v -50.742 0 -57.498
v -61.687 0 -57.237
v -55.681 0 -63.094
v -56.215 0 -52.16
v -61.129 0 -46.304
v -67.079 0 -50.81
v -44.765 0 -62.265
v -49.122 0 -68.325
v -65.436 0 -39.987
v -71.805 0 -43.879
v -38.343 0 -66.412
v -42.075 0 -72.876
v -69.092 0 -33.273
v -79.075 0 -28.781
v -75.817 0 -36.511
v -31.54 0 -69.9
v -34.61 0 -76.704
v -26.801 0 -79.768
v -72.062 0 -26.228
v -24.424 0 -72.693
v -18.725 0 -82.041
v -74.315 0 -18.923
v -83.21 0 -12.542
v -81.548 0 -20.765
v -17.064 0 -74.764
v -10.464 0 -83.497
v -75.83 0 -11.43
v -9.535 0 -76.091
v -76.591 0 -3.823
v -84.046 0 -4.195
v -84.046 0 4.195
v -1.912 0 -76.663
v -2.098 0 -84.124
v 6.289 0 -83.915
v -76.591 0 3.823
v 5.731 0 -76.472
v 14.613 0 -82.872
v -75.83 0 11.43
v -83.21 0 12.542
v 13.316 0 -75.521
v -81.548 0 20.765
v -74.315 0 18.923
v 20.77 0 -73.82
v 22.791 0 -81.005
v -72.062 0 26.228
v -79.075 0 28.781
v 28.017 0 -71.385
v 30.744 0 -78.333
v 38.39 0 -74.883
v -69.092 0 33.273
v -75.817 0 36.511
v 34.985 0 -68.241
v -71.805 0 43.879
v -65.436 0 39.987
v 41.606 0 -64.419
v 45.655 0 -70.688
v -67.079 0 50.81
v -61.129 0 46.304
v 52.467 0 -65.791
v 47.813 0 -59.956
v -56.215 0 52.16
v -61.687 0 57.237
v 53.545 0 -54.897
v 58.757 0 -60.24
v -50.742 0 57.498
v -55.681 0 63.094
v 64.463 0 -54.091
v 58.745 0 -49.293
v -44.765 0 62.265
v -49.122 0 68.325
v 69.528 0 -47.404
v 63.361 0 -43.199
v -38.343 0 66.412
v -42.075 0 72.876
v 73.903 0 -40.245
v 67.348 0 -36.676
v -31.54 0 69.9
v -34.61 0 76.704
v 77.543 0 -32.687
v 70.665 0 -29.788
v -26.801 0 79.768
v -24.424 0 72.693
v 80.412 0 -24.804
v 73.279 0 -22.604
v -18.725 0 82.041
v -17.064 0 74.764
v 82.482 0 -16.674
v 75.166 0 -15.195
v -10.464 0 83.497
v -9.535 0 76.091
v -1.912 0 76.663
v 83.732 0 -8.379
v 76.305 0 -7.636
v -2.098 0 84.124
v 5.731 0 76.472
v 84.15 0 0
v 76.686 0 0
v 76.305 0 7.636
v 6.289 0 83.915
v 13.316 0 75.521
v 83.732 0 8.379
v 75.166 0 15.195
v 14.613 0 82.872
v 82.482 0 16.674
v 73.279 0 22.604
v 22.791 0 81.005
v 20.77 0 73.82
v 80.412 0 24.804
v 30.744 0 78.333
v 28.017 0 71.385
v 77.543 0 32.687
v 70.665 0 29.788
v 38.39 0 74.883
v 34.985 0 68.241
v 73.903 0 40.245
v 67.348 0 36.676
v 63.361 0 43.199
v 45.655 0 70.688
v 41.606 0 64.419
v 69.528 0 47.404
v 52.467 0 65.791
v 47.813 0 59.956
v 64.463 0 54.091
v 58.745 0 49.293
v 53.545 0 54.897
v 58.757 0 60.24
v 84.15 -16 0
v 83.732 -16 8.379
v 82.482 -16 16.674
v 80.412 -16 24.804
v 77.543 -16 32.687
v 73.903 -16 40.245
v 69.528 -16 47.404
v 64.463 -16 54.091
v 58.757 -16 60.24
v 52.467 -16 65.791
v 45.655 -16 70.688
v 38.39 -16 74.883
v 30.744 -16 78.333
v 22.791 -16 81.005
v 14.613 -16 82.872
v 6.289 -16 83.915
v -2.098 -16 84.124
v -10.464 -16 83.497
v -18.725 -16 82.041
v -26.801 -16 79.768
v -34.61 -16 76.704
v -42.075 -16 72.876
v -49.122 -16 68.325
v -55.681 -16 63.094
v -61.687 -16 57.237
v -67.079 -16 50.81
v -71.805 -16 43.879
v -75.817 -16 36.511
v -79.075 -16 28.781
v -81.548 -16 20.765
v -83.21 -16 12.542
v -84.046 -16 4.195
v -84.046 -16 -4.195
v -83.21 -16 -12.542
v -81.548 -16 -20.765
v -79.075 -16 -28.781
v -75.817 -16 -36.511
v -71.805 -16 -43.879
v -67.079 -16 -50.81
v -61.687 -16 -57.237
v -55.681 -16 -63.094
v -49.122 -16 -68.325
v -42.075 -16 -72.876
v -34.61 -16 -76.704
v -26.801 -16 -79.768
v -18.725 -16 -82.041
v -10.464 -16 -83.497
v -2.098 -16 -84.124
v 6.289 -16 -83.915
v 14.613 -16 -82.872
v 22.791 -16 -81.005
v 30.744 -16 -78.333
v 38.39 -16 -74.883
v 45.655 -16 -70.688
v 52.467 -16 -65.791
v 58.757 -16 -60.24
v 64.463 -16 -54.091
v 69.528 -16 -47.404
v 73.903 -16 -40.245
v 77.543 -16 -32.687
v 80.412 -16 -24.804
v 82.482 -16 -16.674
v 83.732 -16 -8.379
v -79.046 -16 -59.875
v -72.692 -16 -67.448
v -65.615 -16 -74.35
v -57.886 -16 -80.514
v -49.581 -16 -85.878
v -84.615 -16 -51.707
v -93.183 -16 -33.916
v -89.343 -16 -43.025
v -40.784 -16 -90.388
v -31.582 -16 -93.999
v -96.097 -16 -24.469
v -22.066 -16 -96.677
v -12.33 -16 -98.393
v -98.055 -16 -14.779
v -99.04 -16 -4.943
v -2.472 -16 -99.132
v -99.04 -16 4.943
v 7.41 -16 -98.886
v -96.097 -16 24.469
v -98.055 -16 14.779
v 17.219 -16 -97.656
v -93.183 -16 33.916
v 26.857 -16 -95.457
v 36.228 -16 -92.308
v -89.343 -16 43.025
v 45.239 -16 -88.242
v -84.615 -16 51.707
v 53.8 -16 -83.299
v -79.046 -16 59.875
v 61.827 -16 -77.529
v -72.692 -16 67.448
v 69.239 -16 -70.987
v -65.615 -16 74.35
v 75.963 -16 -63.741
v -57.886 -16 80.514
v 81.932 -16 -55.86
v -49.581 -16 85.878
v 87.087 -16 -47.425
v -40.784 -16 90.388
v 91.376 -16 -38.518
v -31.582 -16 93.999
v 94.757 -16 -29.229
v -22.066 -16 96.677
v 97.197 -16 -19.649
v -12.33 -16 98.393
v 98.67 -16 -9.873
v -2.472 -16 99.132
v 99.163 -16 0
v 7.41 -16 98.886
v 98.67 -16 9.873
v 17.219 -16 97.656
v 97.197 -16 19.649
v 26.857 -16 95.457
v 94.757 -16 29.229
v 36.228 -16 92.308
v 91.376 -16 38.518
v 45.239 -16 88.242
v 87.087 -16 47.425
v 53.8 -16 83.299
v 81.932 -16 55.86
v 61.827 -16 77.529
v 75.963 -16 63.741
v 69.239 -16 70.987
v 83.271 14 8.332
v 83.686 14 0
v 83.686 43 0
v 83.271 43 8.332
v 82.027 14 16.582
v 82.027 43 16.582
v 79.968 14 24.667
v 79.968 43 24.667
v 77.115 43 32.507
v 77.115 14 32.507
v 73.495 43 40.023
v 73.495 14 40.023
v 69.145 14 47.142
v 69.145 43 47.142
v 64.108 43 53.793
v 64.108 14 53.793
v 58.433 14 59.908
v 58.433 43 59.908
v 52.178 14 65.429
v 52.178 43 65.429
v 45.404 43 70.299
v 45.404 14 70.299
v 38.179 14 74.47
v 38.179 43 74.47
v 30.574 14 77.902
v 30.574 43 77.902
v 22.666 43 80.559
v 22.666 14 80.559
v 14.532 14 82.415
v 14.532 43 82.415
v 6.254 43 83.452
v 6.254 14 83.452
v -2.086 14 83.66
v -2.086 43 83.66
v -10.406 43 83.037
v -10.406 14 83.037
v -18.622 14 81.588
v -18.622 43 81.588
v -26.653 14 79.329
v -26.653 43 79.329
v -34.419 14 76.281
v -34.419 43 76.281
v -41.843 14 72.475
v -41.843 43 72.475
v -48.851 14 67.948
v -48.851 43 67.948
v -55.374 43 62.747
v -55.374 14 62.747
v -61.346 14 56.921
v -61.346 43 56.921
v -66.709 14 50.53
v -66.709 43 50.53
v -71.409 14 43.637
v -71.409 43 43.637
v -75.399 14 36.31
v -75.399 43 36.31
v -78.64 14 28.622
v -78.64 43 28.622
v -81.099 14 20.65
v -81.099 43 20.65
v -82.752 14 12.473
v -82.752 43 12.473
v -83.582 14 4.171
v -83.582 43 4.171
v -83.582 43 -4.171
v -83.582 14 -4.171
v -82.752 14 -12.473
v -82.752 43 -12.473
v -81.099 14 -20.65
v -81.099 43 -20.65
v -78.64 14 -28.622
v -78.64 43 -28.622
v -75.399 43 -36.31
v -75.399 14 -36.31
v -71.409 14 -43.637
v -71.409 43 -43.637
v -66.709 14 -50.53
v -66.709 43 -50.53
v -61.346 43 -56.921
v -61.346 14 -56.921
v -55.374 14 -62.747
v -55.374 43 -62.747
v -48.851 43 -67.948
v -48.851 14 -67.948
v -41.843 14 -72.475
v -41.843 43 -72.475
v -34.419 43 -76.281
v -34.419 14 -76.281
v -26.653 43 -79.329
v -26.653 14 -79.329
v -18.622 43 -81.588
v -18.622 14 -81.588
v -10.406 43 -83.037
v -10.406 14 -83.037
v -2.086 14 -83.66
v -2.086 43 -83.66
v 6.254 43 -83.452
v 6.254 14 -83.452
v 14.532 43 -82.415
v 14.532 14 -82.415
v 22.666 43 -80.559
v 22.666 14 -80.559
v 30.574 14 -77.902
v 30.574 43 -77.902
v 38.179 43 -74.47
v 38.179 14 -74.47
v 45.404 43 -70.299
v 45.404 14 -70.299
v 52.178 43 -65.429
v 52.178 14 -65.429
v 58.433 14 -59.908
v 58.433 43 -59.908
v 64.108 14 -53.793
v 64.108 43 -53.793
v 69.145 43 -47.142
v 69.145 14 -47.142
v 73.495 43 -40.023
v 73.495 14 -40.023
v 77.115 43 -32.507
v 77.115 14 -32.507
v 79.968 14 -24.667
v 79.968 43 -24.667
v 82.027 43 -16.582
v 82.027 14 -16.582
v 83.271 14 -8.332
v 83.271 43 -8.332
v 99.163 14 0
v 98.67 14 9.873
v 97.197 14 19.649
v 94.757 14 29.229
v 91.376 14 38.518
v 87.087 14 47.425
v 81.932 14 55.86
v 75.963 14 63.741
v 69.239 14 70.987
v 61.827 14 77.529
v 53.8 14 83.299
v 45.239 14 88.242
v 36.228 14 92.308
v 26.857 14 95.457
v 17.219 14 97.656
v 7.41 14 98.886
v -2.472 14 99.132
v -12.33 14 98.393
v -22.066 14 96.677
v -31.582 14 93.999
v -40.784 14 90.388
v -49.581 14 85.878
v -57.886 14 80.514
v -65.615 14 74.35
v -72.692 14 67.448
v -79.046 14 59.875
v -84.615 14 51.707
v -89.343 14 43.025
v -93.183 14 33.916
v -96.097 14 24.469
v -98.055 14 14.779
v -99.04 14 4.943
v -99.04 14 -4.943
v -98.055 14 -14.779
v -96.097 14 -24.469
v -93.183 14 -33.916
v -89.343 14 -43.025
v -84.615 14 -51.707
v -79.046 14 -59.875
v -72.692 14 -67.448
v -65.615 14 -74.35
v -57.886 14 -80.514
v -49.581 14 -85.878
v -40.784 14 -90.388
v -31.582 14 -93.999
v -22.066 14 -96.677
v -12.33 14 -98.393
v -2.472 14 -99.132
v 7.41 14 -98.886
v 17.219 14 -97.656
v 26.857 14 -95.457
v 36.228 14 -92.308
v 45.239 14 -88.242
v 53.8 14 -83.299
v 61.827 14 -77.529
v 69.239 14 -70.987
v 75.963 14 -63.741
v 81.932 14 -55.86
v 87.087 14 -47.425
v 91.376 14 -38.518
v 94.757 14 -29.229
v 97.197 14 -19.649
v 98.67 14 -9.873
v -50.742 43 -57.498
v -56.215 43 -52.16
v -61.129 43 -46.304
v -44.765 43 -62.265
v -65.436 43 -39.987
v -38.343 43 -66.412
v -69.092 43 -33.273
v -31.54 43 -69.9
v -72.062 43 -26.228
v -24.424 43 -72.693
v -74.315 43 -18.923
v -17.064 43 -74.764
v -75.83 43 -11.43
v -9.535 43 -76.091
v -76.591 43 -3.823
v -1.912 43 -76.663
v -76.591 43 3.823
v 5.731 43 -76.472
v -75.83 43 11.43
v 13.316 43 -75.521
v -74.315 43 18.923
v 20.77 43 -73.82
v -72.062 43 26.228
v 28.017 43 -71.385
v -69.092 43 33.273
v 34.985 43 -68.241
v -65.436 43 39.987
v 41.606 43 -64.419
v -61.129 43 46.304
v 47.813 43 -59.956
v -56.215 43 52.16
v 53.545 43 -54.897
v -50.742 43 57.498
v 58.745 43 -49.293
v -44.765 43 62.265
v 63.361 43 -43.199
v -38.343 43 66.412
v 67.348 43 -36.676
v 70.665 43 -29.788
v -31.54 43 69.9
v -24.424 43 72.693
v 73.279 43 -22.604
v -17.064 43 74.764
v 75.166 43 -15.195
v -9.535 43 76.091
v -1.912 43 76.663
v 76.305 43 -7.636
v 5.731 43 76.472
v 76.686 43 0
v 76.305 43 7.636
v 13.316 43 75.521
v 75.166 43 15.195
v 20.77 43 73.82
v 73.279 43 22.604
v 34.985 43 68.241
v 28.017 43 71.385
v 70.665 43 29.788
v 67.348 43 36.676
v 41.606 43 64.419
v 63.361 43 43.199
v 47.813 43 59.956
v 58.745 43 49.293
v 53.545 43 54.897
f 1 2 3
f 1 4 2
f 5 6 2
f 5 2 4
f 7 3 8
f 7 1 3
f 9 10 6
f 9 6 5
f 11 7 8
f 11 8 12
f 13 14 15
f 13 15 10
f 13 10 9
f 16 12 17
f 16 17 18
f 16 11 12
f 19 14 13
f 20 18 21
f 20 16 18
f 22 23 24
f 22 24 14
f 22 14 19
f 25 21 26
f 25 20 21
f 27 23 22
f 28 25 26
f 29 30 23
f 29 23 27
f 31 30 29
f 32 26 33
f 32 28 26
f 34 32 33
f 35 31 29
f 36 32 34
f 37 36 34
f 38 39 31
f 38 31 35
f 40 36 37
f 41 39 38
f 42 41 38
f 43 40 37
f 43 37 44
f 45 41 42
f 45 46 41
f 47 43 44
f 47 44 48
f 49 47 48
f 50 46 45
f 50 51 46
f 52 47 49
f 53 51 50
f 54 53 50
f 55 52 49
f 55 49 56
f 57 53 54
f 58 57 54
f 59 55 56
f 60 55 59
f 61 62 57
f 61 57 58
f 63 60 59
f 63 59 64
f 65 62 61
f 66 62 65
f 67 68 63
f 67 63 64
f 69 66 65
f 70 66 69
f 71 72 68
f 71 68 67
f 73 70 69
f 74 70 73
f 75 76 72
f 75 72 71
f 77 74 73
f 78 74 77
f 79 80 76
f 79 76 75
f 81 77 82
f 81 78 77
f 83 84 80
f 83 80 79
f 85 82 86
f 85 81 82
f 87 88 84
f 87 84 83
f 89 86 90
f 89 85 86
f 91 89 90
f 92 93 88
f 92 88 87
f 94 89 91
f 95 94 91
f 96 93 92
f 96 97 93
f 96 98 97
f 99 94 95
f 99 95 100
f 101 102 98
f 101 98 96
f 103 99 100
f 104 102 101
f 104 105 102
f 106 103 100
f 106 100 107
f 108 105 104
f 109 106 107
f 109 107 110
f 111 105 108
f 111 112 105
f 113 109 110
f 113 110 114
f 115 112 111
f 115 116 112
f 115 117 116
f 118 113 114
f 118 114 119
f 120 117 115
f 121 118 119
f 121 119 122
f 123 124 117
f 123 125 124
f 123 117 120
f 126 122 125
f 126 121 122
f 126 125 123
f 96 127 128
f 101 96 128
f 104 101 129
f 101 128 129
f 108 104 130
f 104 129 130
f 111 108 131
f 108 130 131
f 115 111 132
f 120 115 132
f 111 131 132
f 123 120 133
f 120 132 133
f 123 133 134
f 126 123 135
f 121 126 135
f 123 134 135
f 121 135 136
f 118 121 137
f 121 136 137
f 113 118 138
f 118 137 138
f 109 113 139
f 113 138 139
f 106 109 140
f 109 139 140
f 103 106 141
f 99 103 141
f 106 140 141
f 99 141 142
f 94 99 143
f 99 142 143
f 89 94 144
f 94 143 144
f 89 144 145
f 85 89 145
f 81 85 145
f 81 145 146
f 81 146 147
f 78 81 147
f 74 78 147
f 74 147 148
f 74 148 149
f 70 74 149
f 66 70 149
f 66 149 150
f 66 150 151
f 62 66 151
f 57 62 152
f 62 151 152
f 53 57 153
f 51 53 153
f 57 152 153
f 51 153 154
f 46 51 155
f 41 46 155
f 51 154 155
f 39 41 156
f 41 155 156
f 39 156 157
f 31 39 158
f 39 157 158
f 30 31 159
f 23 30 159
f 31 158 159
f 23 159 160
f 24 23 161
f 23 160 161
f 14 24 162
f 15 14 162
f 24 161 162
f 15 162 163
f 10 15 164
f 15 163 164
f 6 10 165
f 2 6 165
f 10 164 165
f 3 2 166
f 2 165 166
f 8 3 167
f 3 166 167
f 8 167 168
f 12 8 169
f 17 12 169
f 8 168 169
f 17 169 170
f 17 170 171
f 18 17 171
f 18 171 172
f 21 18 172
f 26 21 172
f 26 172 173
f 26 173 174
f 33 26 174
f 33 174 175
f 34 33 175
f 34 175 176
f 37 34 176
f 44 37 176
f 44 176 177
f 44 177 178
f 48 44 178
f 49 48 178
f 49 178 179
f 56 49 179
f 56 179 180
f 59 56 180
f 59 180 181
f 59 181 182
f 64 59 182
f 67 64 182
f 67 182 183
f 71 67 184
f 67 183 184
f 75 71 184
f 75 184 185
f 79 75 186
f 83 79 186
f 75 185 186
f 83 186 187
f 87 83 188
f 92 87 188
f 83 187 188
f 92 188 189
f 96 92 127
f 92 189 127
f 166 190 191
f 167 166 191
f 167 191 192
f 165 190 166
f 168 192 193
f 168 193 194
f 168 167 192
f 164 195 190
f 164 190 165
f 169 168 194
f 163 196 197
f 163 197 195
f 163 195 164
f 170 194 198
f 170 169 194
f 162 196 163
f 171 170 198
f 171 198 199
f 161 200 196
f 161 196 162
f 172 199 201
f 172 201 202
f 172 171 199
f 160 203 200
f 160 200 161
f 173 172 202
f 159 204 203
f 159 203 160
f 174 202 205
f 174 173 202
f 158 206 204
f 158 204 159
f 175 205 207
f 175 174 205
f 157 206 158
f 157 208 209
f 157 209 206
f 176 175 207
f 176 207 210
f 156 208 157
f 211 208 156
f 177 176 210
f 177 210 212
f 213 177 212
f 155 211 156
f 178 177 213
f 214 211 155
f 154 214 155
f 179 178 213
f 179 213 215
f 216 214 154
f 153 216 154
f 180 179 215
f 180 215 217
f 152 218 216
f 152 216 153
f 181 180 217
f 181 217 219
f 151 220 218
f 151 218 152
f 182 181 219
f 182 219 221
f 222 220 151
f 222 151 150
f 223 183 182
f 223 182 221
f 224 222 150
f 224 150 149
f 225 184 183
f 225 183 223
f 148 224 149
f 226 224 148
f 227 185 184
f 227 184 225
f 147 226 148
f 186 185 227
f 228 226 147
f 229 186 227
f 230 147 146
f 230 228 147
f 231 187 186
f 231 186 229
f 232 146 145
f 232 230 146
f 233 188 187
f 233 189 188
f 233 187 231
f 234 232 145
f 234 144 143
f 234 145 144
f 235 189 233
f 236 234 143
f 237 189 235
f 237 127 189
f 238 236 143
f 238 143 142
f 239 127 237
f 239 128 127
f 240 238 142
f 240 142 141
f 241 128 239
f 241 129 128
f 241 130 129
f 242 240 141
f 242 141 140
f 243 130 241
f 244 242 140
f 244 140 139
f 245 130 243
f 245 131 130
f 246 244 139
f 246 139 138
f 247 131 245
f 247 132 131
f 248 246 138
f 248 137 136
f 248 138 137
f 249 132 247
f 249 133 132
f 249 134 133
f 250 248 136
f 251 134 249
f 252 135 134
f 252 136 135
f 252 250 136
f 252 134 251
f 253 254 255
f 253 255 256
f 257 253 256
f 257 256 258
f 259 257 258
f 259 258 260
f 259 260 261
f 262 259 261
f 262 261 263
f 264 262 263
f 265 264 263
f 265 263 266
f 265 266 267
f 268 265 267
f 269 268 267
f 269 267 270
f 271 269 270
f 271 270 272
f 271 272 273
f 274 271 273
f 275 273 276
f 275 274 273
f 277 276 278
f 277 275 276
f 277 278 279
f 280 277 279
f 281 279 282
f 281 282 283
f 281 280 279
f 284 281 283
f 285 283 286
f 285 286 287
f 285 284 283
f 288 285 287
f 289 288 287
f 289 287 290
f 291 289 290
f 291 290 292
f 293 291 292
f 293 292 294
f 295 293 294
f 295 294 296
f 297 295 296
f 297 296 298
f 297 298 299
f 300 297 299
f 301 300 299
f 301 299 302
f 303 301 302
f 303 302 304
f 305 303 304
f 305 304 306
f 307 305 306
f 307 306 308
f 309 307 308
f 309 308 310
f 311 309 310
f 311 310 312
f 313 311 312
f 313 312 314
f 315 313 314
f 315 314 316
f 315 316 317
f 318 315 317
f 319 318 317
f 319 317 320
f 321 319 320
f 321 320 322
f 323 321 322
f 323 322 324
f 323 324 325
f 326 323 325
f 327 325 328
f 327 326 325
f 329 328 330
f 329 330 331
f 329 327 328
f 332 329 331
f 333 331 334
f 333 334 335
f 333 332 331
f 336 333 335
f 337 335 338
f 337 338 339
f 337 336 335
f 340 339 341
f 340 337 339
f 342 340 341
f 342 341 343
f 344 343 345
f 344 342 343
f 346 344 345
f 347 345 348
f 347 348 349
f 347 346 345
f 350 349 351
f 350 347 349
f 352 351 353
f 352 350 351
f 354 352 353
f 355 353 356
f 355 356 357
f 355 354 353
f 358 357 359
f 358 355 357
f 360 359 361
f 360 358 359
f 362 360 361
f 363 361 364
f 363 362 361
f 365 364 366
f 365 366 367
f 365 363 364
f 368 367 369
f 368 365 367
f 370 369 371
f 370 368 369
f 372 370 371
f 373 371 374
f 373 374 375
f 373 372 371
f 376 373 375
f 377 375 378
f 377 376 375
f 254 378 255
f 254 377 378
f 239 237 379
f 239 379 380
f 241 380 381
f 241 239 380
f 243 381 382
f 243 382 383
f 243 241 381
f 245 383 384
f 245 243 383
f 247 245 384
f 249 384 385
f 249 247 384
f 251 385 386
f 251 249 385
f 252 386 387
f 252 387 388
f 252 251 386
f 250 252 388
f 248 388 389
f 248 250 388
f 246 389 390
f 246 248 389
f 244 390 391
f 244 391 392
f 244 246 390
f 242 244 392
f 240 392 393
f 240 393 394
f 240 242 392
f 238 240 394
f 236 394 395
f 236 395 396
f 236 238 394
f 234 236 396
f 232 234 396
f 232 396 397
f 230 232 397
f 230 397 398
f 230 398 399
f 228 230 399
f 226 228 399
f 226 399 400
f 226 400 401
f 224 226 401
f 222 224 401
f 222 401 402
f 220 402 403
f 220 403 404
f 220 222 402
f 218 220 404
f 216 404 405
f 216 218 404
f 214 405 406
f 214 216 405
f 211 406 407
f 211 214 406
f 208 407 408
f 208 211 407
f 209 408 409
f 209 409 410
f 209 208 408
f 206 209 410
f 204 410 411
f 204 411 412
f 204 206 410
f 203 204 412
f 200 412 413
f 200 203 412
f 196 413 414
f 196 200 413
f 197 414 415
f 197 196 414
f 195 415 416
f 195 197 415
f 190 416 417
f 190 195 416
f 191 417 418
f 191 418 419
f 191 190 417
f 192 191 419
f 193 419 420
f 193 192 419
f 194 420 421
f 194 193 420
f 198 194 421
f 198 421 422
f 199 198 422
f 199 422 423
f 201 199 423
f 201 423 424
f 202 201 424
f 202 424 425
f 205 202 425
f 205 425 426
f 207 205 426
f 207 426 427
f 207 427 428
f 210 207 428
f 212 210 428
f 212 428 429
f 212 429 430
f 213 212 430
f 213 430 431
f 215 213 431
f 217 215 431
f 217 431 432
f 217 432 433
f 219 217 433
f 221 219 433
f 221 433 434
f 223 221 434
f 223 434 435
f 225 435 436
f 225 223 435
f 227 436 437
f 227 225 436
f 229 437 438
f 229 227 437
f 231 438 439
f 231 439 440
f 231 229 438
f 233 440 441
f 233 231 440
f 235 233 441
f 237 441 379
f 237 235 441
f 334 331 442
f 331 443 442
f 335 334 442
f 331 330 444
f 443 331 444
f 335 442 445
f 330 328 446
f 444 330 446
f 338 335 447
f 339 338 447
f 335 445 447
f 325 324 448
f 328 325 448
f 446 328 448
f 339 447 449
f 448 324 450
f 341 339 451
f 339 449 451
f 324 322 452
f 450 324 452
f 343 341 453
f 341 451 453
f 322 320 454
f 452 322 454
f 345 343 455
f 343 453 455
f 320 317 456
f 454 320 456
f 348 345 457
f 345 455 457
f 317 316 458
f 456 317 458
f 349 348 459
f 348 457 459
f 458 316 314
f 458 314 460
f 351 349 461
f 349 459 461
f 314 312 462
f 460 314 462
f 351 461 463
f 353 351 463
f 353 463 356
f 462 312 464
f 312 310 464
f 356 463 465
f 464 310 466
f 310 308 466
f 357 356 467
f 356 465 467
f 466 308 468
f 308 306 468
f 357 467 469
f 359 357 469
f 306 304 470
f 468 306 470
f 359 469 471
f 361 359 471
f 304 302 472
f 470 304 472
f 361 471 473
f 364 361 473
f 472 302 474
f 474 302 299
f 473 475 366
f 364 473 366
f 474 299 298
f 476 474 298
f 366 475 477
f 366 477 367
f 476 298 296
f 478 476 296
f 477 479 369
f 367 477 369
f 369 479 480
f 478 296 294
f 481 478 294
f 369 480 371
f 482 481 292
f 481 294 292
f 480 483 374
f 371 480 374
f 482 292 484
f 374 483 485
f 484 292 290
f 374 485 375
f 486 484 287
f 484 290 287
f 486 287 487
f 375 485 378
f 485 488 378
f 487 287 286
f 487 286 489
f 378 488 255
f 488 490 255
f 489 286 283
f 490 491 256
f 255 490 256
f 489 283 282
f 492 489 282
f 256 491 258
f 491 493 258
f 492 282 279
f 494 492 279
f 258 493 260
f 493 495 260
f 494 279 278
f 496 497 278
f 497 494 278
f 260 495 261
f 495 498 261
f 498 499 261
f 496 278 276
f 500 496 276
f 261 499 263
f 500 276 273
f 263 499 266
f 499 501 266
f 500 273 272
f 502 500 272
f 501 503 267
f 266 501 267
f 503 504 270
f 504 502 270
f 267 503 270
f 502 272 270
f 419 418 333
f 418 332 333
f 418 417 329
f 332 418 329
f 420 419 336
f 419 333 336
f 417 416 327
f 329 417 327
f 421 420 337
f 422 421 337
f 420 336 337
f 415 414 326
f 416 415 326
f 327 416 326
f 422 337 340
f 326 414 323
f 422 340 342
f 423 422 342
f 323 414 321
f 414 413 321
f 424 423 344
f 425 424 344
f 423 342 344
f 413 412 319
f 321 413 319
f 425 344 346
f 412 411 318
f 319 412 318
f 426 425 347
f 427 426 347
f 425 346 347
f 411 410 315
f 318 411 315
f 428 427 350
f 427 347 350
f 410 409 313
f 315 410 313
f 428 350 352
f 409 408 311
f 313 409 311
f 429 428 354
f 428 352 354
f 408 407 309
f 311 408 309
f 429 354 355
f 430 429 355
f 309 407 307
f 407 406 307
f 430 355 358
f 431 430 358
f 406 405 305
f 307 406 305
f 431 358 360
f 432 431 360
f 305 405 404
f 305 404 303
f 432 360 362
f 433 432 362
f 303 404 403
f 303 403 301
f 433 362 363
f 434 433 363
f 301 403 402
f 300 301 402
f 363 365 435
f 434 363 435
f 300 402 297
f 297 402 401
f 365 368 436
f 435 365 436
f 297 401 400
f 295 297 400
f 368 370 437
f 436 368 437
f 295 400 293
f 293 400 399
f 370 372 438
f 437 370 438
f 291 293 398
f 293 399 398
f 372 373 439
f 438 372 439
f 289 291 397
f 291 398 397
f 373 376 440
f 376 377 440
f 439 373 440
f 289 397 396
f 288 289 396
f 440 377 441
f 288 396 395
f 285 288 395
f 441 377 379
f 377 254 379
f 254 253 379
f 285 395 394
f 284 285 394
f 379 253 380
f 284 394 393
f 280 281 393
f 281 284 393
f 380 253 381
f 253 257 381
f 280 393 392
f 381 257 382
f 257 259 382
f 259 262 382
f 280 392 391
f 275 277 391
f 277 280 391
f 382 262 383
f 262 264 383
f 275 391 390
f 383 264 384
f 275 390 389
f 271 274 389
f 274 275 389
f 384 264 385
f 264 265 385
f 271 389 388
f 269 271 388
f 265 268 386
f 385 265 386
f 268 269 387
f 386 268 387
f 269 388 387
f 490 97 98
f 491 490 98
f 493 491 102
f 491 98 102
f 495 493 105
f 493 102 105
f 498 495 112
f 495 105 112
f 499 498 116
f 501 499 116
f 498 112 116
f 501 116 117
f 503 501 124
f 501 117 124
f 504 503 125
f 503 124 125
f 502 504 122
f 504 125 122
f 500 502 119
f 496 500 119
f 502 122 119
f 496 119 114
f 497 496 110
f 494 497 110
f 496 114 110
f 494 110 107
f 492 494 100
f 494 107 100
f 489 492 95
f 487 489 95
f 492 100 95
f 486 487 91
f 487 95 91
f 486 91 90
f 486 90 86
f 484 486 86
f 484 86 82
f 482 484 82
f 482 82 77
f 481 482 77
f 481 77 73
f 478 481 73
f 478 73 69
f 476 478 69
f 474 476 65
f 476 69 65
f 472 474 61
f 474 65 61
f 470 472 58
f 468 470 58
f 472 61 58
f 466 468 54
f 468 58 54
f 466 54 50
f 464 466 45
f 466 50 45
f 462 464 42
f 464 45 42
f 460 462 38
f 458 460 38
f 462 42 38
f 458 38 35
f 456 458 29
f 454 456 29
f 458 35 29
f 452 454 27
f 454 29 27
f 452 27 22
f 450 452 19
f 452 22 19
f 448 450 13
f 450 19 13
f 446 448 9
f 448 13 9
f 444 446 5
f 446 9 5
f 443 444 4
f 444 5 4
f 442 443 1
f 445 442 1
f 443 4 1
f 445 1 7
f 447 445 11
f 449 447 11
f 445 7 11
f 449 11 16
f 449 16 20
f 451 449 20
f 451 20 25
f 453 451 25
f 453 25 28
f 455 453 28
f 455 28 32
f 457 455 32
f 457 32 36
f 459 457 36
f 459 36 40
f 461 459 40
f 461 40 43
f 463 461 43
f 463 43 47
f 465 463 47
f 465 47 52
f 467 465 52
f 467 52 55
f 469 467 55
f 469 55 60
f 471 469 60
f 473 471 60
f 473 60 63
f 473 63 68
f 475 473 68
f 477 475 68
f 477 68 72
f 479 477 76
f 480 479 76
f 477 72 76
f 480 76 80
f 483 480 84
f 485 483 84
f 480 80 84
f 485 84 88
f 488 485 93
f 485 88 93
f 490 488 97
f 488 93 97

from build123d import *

# Parameters (mm, degrees)
F0_R     = 98.686434
F0_R_2   = 83.686432
F1_DEPTH = 16
F0_R_3   = 76.686434
F2_DEPTH = 14
F3_DEPTH = 43
F4_R     = 84.150337
F4_R_2   = 83.686432
F5_DEPTH = 16
F6_R     = 99.162904
F6_R_2   = 98.686434
F7_DEPTH = 30


with BuildPart() as f1:
    # F0 (on Front) → F1 (new body)
    with BuildSketch(Plane.XZ):
        Circle(F0_R)
        Circle(F0_R_2, mode=Mode.SUBTRACT)
    extrude(amount=F1_DEPTH)

    # F0 (on Front) → F2 (join)
    with BuildSketch(Plane.XZ):
        Circle(F0_R_2)
        Circle(F0_R_3, mode=Mode.SUBTRACT)
        Circle(F0_R)
        Circle(F0_R_2, mode=Mode.SUBTRACT)
    extrude(amount=-F2_DEPTH)

    # F0 (on Front) → F3 (join)
    with BuildSketch(Plane.XZ):
        Circle(F0_R_2)
        Circle(F0_R_3, mode=Mode.SUBTRACT)
    extrude(amount=-F3_DEPTH)

    # F4 (on face) → F5 (cut)
    with BuildSketch(Plane.XZ.offset(16)):
        Circle(F4_R)
        Circle(F4_R_2, mode=Mode.SUBTRACT)
    extrude(amount=-F5_DEPTH, mode=Mode.SUBTRACT)

    # F6 (on face) → F7 (join)
    with BuildSketch(Plane.XZ.offset(16)):
        Circle(F6_R)
        Circle(F6_R_2, mode=Mode.SUBTRACT)
    extrude(amount=-F7_DEPTH)


solid = f1.part
